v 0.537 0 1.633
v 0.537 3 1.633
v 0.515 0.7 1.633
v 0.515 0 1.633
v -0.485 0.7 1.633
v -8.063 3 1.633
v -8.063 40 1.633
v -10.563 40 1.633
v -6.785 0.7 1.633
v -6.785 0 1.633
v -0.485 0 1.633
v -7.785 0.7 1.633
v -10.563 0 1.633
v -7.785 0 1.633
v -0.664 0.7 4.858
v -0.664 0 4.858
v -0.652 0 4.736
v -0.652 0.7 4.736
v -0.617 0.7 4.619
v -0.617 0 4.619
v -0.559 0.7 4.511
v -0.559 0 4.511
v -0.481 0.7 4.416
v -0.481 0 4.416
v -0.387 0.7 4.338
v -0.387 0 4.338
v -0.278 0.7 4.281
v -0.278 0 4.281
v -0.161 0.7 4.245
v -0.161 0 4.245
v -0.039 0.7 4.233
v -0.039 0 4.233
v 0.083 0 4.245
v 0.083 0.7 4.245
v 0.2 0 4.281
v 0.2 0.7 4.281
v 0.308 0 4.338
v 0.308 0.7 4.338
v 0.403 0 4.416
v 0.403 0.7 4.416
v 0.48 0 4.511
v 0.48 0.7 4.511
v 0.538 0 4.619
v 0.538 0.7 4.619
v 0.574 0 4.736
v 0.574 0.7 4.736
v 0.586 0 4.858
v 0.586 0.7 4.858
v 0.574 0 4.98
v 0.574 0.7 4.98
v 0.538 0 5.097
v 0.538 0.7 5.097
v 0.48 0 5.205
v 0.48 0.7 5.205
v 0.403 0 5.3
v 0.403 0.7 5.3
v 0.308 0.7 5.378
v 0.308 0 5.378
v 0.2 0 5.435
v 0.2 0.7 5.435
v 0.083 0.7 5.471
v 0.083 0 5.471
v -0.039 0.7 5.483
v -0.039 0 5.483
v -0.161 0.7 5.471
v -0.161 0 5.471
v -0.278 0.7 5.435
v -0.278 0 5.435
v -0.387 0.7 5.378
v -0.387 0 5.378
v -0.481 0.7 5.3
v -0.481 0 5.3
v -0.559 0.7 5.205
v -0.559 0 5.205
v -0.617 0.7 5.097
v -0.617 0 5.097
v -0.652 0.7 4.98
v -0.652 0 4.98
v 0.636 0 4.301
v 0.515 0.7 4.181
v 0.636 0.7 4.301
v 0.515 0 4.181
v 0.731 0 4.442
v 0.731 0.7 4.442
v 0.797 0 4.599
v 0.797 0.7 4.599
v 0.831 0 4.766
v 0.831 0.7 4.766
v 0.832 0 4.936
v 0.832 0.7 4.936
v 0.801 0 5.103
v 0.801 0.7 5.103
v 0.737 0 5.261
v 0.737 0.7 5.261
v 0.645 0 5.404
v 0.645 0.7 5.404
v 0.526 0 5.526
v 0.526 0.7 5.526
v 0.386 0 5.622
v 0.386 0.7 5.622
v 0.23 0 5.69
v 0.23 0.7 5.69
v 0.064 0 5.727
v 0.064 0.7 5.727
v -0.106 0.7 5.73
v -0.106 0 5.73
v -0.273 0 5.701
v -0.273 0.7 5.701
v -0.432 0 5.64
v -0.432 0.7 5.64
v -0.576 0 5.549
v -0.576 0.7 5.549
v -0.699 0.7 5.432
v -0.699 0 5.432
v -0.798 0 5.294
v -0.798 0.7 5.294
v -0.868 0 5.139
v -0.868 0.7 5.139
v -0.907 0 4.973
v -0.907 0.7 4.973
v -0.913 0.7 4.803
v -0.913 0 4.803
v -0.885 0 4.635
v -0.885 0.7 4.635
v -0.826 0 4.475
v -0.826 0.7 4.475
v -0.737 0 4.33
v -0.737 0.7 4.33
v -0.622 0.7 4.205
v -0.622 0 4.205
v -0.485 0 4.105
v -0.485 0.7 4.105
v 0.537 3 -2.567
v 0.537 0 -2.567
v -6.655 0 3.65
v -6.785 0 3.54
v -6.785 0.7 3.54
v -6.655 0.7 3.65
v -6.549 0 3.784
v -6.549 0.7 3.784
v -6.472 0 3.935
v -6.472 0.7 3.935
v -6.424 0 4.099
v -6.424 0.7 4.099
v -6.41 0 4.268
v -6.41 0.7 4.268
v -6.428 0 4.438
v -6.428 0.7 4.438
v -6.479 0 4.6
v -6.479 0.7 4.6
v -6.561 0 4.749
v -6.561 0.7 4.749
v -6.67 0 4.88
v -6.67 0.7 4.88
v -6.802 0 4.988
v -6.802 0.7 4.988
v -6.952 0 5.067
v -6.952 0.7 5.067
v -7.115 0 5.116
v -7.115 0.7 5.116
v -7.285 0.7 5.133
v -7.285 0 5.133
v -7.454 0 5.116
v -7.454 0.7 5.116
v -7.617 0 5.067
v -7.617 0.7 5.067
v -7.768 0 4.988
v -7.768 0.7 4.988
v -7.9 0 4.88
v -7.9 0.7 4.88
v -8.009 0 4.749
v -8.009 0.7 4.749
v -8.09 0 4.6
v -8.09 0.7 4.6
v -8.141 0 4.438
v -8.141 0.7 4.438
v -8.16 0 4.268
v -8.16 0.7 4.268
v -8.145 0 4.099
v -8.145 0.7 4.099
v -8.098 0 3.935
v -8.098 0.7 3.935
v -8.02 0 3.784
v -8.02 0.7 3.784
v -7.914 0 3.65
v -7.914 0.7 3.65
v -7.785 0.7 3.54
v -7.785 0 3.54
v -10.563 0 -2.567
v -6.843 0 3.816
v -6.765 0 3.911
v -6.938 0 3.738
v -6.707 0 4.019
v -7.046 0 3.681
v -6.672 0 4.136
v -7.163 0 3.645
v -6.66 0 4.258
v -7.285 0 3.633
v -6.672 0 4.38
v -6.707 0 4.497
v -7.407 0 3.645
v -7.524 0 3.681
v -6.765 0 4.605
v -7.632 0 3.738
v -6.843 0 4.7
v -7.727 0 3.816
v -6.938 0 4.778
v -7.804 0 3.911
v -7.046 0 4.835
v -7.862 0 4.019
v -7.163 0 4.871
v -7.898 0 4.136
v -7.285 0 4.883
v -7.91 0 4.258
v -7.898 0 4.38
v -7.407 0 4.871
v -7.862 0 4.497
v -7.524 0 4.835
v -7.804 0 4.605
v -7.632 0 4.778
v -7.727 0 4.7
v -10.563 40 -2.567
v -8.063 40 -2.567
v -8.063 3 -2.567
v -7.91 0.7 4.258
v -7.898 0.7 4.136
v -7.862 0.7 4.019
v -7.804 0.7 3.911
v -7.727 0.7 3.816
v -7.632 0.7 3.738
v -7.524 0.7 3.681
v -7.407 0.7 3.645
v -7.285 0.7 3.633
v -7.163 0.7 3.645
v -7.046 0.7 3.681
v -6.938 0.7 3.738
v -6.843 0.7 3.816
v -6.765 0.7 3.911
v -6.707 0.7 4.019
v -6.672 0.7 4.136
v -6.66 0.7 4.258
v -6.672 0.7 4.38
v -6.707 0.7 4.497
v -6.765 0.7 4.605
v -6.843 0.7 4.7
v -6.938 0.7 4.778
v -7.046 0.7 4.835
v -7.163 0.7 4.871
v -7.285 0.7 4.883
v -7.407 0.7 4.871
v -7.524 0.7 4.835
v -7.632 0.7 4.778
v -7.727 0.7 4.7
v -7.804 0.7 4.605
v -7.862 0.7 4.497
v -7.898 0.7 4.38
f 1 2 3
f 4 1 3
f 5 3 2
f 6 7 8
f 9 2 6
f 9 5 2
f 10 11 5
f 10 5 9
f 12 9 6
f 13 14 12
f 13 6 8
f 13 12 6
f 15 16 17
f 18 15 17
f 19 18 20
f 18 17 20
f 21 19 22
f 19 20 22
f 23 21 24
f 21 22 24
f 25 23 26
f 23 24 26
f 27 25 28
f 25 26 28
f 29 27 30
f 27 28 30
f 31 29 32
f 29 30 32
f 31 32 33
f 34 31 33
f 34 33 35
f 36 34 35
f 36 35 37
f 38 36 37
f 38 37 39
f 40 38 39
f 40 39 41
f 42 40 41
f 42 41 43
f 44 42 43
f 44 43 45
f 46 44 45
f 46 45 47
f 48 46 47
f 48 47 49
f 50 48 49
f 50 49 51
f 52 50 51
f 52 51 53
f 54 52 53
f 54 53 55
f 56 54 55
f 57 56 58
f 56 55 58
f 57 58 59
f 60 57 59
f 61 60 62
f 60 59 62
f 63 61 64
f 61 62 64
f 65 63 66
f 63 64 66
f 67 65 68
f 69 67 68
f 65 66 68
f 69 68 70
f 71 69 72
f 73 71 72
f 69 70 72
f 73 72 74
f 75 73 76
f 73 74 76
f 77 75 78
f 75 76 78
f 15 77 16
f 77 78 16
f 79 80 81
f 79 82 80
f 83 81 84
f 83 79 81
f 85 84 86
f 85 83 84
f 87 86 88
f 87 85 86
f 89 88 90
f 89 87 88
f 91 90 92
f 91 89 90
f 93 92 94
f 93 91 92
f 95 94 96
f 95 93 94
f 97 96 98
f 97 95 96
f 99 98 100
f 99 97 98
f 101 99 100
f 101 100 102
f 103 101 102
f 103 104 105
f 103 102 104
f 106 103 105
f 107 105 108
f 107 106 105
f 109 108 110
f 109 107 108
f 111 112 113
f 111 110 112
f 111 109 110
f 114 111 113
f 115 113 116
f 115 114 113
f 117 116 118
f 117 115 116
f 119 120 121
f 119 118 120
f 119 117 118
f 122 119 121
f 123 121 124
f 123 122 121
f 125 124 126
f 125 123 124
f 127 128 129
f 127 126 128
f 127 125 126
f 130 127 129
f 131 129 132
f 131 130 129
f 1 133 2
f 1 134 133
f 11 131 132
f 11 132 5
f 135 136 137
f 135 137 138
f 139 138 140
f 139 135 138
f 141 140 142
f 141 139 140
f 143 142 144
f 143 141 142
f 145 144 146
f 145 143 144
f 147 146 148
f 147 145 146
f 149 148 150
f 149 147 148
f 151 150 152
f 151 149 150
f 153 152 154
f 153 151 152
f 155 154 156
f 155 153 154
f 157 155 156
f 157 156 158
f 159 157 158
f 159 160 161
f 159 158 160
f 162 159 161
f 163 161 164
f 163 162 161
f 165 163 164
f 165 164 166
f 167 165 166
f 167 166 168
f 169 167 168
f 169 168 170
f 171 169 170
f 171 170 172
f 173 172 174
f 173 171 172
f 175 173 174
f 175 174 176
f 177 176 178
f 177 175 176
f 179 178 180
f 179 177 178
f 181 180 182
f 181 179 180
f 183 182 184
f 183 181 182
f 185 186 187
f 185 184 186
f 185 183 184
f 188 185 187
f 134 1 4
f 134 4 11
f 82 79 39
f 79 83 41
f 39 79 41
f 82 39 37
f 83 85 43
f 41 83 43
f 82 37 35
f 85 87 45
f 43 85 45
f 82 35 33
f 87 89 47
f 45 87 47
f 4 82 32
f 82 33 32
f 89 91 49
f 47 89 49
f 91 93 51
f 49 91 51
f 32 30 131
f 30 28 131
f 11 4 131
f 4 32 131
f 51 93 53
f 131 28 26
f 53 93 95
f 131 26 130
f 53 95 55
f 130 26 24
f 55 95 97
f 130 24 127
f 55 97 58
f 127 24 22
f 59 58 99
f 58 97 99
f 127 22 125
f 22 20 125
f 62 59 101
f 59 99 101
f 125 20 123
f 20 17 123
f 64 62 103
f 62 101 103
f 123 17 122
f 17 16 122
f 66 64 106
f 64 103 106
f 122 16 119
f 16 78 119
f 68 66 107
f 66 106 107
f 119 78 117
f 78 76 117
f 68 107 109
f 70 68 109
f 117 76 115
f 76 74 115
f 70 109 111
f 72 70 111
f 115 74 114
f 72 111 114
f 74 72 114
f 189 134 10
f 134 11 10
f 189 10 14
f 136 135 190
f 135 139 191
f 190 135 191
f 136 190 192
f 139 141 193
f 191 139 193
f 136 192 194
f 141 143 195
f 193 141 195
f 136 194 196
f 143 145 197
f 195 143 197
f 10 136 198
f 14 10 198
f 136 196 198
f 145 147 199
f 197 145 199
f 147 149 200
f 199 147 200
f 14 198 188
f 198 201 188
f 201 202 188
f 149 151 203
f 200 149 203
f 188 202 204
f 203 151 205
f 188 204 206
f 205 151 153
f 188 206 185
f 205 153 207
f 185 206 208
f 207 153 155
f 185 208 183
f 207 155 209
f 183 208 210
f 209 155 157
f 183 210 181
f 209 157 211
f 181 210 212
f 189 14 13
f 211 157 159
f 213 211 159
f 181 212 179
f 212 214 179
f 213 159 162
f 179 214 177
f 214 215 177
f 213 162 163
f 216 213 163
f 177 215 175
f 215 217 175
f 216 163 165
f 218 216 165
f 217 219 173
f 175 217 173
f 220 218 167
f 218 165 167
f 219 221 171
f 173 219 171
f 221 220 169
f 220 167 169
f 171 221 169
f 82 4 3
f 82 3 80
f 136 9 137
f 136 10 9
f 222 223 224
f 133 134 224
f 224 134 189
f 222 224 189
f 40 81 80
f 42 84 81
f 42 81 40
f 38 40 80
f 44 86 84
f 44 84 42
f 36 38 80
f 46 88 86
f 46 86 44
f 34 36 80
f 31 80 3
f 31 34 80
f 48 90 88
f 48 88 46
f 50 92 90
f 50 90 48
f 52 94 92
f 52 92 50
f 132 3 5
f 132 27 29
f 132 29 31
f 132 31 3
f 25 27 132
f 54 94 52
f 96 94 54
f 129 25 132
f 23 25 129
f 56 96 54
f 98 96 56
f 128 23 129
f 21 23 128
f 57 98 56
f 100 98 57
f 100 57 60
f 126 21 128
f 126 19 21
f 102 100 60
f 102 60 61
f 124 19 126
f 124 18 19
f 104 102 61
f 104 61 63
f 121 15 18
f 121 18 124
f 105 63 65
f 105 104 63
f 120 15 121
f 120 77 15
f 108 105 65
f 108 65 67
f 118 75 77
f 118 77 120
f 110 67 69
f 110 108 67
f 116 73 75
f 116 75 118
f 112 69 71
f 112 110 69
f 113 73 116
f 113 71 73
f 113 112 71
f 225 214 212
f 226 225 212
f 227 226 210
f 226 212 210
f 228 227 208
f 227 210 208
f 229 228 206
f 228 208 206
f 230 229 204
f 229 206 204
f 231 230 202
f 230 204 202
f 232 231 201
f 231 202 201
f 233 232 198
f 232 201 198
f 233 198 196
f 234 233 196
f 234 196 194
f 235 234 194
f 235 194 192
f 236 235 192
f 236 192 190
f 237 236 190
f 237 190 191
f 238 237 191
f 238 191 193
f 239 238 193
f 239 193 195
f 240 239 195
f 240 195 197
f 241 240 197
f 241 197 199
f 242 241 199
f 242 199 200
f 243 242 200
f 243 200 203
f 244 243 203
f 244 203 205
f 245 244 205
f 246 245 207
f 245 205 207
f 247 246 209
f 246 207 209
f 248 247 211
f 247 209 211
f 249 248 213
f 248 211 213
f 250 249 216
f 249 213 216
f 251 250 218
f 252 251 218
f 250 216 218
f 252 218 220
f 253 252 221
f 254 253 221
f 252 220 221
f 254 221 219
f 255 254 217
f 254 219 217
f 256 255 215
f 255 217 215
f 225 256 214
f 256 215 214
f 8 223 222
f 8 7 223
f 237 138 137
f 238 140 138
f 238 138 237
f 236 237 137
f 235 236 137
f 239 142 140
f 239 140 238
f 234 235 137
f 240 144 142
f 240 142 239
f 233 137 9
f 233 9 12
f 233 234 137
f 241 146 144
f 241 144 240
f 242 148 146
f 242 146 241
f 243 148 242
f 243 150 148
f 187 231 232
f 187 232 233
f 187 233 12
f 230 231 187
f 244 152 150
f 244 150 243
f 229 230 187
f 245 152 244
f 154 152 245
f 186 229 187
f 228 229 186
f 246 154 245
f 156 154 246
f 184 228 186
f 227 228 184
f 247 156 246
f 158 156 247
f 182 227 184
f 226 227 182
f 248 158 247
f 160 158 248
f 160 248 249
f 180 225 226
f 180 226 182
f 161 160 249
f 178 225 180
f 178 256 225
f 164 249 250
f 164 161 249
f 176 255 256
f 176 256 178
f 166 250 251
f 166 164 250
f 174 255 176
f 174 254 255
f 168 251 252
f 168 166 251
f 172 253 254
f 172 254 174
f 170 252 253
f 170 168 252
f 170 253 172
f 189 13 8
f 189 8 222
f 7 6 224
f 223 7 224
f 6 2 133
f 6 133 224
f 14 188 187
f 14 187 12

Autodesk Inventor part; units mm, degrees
ref_plane "YZ Plane" through (0, 0, 0) normal (1, 0, 0) x (0, 1, 0)
ref_plane "XZ Plane" through (0, 0, 0) normal (0, 1, 0) x (-1, 0, 0)
ref_plane "XY Plane" through (0, 0, 0) normal (0, 0, 1) x (1, 0, 0)
sketch "Sketch1" plane through (0, 0, 0) normal (0, 1, 0) x (-1, 0, 0)
  line L0 (-0.537, 0.033) -> (-0.537, -0.967)
  line L1 (-0.537, -0.467) -> (-0.537, -2.567)
  line L2 (-0.537, -2.567) -> (10.563, -2.567)
  line L3 (-0.537, -0.967) -> (-0.537, 0.033)
  line L4 (-0.537, 1.633) -> (10.563, 1.633)
  line L5 (-0.537, -0.467) -> (-0.537, 1.633)
  line L6 (10.563, 1.633) -> (10.563, -2.567)
  line L7 (10.563, 1.633) -> (8.063, 1.633)
  line L8 (8.063, 1.633) -> (8.063, -2.567)
  line L9 (10.563, -2.567) -> (10.563, 1.633)
  line L10 (7.7848, 1.633) -> (6.7848, 1.633)
  line L11 (6.7848, 1.633) -> (6.7848, 3.5399)
  line L12 (6.7848, 3.633) -> (7.2848, 3.633)
  line L13 (7.7848, 3.5399) -> (7.7848, 1.633)
  line L14 (0.4848, 1.633) -> (-0.5152, 1.633)
  line L15 (-0.5152, 1.633) -> (-0.5152, 4.1811)
  line L16 (-0.5152, 4.233) -> (0.0393, 4.233)
  line L17 (0.4848, 4.1049) -> (0.4848, 1.633)
  circle A0 centre (7.2848, 4.258) radius 0.625
  arc A1 (7.7848, 3.5399) -> (6.7848, 3.5399) centre (7.2848, 4.258) ccw
  circle A2 centre (0.0393, 4.858) radius 0.625
  arc A3 (0.4848, 4.1049) -> (-0.5152, 4.1811) centre (0.0393, 4.858) ccw
  point P0 (1.1114, -1.7636)
  point P1 (1.1114, -2.7636)
  point P2 (-0.0152, 4.233)
  point P3 (0.0393, 4.0356)
  point P4 (6.7848, 1.633)
  point P5 (-0.5152, 1.633)
  point P6 (7.2848, 1.633)
  dimension "d13" = 1.25
  dimension "d15" = 1.25
  dimension "d4" = 11.1
  dimension "d5" = 4.2
  dimension "d6" = 2.5
  dimension "d9" = 7.3
  dimension "d11" = 1
  dimension "d12" = 1
  dimension "d14" = 1.75
  dimension "d16" = 1.75
  dimension "d17" = 0.6
  dimension "d26" = 2
extrude "Extrusion1" add sketch "Sketch1" along normal blind 0.7 contours L11 A1 L13 L4
extrude "Extrusion2" add sketch "Sketch1" along normal blind 40 contours L8 L4 L6 L2
extrude "Extrusion3" add sketch "Sketch1" along normal blind 3 contours L5 L4 L8 L2 L1 L0
extrude "Extrusion4" add sketch "Sketch1" along normal blind 0.7 contours L15 A3 L17 L4
properties part number "optrode_holder_maelle"
